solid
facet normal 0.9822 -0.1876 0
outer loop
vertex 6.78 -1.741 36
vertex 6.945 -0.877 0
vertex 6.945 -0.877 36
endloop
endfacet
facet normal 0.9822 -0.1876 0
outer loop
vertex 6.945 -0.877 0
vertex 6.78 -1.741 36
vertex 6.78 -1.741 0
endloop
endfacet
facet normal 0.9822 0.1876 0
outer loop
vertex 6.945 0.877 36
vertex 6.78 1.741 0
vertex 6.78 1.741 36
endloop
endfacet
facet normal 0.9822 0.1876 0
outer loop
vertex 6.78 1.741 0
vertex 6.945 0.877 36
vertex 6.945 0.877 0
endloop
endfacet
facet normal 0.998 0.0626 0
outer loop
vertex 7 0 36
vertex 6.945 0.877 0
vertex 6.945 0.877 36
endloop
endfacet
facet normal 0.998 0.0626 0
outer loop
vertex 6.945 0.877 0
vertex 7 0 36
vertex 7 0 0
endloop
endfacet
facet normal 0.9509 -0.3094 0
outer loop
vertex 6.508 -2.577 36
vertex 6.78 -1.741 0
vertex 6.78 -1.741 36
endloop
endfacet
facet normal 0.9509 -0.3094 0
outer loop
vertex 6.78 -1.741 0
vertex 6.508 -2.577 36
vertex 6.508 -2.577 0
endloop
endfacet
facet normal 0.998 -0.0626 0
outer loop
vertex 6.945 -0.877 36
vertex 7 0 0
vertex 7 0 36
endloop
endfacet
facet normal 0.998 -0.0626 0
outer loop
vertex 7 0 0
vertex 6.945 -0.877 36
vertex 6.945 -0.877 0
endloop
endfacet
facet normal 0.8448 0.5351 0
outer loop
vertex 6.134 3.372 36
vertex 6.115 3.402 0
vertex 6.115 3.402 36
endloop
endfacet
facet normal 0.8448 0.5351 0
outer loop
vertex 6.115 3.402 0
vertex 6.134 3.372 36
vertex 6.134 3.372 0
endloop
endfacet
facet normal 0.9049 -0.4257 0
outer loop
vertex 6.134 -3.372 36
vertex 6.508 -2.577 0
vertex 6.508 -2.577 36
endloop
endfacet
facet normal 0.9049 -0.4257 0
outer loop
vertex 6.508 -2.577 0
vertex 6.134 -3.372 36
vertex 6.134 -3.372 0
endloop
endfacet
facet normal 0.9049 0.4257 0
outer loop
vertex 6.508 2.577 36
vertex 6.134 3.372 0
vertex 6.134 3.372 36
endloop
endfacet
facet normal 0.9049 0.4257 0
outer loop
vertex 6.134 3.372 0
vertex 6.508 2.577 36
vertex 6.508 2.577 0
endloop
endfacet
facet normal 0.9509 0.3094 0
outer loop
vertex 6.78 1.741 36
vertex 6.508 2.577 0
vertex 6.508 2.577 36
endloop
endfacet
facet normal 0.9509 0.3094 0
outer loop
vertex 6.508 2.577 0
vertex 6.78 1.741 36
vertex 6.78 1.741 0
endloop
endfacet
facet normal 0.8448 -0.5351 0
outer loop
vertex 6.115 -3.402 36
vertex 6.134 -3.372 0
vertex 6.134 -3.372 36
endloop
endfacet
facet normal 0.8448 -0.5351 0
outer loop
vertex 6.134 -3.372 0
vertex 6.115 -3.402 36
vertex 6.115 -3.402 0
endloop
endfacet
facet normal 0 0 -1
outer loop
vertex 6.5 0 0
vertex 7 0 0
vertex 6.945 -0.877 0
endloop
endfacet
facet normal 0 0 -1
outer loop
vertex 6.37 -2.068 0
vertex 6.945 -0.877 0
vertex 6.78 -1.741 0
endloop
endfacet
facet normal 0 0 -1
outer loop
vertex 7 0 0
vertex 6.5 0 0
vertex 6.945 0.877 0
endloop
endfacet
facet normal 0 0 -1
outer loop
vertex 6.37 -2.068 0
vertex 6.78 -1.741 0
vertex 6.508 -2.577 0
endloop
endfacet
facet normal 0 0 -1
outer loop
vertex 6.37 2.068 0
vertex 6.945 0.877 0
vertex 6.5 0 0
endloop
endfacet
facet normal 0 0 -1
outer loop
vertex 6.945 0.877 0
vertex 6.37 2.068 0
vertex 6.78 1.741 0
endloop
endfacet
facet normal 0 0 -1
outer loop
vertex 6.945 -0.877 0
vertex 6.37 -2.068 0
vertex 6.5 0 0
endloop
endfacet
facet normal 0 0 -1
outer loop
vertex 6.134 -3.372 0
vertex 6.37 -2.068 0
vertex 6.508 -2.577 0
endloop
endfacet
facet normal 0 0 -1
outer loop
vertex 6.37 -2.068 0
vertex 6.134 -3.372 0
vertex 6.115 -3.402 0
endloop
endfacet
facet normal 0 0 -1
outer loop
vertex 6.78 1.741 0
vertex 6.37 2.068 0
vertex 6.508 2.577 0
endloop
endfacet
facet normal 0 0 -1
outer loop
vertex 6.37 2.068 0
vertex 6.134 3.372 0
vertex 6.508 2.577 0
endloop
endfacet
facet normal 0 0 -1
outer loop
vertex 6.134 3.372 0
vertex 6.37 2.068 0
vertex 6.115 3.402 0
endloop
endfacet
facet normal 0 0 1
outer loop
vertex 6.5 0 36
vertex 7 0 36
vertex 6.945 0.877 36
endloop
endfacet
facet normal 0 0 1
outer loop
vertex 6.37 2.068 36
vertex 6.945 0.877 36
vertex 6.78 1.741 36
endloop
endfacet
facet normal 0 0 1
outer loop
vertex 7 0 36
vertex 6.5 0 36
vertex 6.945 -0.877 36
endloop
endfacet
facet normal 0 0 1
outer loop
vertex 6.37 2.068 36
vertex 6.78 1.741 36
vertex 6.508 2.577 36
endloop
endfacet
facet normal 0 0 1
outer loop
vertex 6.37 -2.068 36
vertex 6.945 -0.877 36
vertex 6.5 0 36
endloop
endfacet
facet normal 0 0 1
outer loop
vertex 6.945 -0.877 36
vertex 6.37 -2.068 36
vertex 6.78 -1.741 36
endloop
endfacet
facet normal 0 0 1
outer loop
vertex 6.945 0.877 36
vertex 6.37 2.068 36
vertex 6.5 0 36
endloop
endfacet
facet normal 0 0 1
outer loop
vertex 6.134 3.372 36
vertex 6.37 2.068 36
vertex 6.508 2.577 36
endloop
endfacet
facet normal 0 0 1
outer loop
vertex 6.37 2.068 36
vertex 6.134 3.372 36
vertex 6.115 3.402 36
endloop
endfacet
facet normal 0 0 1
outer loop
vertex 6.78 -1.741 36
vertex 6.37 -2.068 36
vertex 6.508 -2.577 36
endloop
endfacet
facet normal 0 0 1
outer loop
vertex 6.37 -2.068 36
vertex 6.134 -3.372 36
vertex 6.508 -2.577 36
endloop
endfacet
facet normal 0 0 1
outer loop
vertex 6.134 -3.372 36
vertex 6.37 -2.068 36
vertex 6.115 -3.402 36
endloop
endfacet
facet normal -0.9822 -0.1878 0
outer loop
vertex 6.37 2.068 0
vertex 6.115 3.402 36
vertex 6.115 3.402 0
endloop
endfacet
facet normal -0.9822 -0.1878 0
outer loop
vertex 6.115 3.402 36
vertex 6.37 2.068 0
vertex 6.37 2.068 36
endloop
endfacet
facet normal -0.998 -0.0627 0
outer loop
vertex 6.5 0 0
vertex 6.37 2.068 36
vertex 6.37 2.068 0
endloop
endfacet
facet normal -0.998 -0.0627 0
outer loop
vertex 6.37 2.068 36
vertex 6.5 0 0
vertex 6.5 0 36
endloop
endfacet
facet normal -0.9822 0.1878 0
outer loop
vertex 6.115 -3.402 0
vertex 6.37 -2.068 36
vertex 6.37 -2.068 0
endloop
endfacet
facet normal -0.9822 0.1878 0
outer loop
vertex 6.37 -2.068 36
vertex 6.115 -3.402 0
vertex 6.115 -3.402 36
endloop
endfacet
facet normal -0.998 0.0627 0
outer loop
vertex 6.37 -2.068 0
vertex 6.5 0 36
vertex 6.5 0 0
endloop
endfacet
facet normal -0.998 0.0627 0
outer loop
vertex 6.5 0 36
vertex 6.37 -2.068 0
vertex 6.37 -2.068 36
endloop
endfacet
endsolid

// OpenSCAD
$fn = 50;


difference() {
	union() {
		cylinder(h = 36, r = 7.0000000000);
		translate(v = [-13.0000000000, 0, 0]) {
			cylinder(h = 36, r = 7.0000000000);
		}
	}
	union() {
		cylinder(h = 36, r = 3.2500000000);
		cylinder(h = 36, r = 1.8000000000);
		cylinder(h = 36, r = 1.8000000000);
		cylinder(h = 36, r = 1.8000000000);
		translate(v = [-17.5000000000, 0, 0]) {
			hull() {
				translate(v = [-3.7500000000, 0.0000000000, 0]) {
					cylinder(h = 36, r = 7.5000000000);
				}
				translate(v = [3.7500000000, 0.0000000000, 0]) {
					cylinder(h = 36, r = 7.5000000000);
				}
				translate(v = [-3.7500000000, -0.0000000000, 0]) {
					cylinder(h = 36, r = 7.5000000000);
				}
				translate(v = [3.7500000000, -0.0000000000, 0]) {
					cylinder(h = 36, r = 7.5000000000);
				}
			}
		}
		translate(v = [-10.0000000000, 0, 0.0000000000]) {
			cylinder(h = 36, r = 16.5000000000);
		}
	}
}
